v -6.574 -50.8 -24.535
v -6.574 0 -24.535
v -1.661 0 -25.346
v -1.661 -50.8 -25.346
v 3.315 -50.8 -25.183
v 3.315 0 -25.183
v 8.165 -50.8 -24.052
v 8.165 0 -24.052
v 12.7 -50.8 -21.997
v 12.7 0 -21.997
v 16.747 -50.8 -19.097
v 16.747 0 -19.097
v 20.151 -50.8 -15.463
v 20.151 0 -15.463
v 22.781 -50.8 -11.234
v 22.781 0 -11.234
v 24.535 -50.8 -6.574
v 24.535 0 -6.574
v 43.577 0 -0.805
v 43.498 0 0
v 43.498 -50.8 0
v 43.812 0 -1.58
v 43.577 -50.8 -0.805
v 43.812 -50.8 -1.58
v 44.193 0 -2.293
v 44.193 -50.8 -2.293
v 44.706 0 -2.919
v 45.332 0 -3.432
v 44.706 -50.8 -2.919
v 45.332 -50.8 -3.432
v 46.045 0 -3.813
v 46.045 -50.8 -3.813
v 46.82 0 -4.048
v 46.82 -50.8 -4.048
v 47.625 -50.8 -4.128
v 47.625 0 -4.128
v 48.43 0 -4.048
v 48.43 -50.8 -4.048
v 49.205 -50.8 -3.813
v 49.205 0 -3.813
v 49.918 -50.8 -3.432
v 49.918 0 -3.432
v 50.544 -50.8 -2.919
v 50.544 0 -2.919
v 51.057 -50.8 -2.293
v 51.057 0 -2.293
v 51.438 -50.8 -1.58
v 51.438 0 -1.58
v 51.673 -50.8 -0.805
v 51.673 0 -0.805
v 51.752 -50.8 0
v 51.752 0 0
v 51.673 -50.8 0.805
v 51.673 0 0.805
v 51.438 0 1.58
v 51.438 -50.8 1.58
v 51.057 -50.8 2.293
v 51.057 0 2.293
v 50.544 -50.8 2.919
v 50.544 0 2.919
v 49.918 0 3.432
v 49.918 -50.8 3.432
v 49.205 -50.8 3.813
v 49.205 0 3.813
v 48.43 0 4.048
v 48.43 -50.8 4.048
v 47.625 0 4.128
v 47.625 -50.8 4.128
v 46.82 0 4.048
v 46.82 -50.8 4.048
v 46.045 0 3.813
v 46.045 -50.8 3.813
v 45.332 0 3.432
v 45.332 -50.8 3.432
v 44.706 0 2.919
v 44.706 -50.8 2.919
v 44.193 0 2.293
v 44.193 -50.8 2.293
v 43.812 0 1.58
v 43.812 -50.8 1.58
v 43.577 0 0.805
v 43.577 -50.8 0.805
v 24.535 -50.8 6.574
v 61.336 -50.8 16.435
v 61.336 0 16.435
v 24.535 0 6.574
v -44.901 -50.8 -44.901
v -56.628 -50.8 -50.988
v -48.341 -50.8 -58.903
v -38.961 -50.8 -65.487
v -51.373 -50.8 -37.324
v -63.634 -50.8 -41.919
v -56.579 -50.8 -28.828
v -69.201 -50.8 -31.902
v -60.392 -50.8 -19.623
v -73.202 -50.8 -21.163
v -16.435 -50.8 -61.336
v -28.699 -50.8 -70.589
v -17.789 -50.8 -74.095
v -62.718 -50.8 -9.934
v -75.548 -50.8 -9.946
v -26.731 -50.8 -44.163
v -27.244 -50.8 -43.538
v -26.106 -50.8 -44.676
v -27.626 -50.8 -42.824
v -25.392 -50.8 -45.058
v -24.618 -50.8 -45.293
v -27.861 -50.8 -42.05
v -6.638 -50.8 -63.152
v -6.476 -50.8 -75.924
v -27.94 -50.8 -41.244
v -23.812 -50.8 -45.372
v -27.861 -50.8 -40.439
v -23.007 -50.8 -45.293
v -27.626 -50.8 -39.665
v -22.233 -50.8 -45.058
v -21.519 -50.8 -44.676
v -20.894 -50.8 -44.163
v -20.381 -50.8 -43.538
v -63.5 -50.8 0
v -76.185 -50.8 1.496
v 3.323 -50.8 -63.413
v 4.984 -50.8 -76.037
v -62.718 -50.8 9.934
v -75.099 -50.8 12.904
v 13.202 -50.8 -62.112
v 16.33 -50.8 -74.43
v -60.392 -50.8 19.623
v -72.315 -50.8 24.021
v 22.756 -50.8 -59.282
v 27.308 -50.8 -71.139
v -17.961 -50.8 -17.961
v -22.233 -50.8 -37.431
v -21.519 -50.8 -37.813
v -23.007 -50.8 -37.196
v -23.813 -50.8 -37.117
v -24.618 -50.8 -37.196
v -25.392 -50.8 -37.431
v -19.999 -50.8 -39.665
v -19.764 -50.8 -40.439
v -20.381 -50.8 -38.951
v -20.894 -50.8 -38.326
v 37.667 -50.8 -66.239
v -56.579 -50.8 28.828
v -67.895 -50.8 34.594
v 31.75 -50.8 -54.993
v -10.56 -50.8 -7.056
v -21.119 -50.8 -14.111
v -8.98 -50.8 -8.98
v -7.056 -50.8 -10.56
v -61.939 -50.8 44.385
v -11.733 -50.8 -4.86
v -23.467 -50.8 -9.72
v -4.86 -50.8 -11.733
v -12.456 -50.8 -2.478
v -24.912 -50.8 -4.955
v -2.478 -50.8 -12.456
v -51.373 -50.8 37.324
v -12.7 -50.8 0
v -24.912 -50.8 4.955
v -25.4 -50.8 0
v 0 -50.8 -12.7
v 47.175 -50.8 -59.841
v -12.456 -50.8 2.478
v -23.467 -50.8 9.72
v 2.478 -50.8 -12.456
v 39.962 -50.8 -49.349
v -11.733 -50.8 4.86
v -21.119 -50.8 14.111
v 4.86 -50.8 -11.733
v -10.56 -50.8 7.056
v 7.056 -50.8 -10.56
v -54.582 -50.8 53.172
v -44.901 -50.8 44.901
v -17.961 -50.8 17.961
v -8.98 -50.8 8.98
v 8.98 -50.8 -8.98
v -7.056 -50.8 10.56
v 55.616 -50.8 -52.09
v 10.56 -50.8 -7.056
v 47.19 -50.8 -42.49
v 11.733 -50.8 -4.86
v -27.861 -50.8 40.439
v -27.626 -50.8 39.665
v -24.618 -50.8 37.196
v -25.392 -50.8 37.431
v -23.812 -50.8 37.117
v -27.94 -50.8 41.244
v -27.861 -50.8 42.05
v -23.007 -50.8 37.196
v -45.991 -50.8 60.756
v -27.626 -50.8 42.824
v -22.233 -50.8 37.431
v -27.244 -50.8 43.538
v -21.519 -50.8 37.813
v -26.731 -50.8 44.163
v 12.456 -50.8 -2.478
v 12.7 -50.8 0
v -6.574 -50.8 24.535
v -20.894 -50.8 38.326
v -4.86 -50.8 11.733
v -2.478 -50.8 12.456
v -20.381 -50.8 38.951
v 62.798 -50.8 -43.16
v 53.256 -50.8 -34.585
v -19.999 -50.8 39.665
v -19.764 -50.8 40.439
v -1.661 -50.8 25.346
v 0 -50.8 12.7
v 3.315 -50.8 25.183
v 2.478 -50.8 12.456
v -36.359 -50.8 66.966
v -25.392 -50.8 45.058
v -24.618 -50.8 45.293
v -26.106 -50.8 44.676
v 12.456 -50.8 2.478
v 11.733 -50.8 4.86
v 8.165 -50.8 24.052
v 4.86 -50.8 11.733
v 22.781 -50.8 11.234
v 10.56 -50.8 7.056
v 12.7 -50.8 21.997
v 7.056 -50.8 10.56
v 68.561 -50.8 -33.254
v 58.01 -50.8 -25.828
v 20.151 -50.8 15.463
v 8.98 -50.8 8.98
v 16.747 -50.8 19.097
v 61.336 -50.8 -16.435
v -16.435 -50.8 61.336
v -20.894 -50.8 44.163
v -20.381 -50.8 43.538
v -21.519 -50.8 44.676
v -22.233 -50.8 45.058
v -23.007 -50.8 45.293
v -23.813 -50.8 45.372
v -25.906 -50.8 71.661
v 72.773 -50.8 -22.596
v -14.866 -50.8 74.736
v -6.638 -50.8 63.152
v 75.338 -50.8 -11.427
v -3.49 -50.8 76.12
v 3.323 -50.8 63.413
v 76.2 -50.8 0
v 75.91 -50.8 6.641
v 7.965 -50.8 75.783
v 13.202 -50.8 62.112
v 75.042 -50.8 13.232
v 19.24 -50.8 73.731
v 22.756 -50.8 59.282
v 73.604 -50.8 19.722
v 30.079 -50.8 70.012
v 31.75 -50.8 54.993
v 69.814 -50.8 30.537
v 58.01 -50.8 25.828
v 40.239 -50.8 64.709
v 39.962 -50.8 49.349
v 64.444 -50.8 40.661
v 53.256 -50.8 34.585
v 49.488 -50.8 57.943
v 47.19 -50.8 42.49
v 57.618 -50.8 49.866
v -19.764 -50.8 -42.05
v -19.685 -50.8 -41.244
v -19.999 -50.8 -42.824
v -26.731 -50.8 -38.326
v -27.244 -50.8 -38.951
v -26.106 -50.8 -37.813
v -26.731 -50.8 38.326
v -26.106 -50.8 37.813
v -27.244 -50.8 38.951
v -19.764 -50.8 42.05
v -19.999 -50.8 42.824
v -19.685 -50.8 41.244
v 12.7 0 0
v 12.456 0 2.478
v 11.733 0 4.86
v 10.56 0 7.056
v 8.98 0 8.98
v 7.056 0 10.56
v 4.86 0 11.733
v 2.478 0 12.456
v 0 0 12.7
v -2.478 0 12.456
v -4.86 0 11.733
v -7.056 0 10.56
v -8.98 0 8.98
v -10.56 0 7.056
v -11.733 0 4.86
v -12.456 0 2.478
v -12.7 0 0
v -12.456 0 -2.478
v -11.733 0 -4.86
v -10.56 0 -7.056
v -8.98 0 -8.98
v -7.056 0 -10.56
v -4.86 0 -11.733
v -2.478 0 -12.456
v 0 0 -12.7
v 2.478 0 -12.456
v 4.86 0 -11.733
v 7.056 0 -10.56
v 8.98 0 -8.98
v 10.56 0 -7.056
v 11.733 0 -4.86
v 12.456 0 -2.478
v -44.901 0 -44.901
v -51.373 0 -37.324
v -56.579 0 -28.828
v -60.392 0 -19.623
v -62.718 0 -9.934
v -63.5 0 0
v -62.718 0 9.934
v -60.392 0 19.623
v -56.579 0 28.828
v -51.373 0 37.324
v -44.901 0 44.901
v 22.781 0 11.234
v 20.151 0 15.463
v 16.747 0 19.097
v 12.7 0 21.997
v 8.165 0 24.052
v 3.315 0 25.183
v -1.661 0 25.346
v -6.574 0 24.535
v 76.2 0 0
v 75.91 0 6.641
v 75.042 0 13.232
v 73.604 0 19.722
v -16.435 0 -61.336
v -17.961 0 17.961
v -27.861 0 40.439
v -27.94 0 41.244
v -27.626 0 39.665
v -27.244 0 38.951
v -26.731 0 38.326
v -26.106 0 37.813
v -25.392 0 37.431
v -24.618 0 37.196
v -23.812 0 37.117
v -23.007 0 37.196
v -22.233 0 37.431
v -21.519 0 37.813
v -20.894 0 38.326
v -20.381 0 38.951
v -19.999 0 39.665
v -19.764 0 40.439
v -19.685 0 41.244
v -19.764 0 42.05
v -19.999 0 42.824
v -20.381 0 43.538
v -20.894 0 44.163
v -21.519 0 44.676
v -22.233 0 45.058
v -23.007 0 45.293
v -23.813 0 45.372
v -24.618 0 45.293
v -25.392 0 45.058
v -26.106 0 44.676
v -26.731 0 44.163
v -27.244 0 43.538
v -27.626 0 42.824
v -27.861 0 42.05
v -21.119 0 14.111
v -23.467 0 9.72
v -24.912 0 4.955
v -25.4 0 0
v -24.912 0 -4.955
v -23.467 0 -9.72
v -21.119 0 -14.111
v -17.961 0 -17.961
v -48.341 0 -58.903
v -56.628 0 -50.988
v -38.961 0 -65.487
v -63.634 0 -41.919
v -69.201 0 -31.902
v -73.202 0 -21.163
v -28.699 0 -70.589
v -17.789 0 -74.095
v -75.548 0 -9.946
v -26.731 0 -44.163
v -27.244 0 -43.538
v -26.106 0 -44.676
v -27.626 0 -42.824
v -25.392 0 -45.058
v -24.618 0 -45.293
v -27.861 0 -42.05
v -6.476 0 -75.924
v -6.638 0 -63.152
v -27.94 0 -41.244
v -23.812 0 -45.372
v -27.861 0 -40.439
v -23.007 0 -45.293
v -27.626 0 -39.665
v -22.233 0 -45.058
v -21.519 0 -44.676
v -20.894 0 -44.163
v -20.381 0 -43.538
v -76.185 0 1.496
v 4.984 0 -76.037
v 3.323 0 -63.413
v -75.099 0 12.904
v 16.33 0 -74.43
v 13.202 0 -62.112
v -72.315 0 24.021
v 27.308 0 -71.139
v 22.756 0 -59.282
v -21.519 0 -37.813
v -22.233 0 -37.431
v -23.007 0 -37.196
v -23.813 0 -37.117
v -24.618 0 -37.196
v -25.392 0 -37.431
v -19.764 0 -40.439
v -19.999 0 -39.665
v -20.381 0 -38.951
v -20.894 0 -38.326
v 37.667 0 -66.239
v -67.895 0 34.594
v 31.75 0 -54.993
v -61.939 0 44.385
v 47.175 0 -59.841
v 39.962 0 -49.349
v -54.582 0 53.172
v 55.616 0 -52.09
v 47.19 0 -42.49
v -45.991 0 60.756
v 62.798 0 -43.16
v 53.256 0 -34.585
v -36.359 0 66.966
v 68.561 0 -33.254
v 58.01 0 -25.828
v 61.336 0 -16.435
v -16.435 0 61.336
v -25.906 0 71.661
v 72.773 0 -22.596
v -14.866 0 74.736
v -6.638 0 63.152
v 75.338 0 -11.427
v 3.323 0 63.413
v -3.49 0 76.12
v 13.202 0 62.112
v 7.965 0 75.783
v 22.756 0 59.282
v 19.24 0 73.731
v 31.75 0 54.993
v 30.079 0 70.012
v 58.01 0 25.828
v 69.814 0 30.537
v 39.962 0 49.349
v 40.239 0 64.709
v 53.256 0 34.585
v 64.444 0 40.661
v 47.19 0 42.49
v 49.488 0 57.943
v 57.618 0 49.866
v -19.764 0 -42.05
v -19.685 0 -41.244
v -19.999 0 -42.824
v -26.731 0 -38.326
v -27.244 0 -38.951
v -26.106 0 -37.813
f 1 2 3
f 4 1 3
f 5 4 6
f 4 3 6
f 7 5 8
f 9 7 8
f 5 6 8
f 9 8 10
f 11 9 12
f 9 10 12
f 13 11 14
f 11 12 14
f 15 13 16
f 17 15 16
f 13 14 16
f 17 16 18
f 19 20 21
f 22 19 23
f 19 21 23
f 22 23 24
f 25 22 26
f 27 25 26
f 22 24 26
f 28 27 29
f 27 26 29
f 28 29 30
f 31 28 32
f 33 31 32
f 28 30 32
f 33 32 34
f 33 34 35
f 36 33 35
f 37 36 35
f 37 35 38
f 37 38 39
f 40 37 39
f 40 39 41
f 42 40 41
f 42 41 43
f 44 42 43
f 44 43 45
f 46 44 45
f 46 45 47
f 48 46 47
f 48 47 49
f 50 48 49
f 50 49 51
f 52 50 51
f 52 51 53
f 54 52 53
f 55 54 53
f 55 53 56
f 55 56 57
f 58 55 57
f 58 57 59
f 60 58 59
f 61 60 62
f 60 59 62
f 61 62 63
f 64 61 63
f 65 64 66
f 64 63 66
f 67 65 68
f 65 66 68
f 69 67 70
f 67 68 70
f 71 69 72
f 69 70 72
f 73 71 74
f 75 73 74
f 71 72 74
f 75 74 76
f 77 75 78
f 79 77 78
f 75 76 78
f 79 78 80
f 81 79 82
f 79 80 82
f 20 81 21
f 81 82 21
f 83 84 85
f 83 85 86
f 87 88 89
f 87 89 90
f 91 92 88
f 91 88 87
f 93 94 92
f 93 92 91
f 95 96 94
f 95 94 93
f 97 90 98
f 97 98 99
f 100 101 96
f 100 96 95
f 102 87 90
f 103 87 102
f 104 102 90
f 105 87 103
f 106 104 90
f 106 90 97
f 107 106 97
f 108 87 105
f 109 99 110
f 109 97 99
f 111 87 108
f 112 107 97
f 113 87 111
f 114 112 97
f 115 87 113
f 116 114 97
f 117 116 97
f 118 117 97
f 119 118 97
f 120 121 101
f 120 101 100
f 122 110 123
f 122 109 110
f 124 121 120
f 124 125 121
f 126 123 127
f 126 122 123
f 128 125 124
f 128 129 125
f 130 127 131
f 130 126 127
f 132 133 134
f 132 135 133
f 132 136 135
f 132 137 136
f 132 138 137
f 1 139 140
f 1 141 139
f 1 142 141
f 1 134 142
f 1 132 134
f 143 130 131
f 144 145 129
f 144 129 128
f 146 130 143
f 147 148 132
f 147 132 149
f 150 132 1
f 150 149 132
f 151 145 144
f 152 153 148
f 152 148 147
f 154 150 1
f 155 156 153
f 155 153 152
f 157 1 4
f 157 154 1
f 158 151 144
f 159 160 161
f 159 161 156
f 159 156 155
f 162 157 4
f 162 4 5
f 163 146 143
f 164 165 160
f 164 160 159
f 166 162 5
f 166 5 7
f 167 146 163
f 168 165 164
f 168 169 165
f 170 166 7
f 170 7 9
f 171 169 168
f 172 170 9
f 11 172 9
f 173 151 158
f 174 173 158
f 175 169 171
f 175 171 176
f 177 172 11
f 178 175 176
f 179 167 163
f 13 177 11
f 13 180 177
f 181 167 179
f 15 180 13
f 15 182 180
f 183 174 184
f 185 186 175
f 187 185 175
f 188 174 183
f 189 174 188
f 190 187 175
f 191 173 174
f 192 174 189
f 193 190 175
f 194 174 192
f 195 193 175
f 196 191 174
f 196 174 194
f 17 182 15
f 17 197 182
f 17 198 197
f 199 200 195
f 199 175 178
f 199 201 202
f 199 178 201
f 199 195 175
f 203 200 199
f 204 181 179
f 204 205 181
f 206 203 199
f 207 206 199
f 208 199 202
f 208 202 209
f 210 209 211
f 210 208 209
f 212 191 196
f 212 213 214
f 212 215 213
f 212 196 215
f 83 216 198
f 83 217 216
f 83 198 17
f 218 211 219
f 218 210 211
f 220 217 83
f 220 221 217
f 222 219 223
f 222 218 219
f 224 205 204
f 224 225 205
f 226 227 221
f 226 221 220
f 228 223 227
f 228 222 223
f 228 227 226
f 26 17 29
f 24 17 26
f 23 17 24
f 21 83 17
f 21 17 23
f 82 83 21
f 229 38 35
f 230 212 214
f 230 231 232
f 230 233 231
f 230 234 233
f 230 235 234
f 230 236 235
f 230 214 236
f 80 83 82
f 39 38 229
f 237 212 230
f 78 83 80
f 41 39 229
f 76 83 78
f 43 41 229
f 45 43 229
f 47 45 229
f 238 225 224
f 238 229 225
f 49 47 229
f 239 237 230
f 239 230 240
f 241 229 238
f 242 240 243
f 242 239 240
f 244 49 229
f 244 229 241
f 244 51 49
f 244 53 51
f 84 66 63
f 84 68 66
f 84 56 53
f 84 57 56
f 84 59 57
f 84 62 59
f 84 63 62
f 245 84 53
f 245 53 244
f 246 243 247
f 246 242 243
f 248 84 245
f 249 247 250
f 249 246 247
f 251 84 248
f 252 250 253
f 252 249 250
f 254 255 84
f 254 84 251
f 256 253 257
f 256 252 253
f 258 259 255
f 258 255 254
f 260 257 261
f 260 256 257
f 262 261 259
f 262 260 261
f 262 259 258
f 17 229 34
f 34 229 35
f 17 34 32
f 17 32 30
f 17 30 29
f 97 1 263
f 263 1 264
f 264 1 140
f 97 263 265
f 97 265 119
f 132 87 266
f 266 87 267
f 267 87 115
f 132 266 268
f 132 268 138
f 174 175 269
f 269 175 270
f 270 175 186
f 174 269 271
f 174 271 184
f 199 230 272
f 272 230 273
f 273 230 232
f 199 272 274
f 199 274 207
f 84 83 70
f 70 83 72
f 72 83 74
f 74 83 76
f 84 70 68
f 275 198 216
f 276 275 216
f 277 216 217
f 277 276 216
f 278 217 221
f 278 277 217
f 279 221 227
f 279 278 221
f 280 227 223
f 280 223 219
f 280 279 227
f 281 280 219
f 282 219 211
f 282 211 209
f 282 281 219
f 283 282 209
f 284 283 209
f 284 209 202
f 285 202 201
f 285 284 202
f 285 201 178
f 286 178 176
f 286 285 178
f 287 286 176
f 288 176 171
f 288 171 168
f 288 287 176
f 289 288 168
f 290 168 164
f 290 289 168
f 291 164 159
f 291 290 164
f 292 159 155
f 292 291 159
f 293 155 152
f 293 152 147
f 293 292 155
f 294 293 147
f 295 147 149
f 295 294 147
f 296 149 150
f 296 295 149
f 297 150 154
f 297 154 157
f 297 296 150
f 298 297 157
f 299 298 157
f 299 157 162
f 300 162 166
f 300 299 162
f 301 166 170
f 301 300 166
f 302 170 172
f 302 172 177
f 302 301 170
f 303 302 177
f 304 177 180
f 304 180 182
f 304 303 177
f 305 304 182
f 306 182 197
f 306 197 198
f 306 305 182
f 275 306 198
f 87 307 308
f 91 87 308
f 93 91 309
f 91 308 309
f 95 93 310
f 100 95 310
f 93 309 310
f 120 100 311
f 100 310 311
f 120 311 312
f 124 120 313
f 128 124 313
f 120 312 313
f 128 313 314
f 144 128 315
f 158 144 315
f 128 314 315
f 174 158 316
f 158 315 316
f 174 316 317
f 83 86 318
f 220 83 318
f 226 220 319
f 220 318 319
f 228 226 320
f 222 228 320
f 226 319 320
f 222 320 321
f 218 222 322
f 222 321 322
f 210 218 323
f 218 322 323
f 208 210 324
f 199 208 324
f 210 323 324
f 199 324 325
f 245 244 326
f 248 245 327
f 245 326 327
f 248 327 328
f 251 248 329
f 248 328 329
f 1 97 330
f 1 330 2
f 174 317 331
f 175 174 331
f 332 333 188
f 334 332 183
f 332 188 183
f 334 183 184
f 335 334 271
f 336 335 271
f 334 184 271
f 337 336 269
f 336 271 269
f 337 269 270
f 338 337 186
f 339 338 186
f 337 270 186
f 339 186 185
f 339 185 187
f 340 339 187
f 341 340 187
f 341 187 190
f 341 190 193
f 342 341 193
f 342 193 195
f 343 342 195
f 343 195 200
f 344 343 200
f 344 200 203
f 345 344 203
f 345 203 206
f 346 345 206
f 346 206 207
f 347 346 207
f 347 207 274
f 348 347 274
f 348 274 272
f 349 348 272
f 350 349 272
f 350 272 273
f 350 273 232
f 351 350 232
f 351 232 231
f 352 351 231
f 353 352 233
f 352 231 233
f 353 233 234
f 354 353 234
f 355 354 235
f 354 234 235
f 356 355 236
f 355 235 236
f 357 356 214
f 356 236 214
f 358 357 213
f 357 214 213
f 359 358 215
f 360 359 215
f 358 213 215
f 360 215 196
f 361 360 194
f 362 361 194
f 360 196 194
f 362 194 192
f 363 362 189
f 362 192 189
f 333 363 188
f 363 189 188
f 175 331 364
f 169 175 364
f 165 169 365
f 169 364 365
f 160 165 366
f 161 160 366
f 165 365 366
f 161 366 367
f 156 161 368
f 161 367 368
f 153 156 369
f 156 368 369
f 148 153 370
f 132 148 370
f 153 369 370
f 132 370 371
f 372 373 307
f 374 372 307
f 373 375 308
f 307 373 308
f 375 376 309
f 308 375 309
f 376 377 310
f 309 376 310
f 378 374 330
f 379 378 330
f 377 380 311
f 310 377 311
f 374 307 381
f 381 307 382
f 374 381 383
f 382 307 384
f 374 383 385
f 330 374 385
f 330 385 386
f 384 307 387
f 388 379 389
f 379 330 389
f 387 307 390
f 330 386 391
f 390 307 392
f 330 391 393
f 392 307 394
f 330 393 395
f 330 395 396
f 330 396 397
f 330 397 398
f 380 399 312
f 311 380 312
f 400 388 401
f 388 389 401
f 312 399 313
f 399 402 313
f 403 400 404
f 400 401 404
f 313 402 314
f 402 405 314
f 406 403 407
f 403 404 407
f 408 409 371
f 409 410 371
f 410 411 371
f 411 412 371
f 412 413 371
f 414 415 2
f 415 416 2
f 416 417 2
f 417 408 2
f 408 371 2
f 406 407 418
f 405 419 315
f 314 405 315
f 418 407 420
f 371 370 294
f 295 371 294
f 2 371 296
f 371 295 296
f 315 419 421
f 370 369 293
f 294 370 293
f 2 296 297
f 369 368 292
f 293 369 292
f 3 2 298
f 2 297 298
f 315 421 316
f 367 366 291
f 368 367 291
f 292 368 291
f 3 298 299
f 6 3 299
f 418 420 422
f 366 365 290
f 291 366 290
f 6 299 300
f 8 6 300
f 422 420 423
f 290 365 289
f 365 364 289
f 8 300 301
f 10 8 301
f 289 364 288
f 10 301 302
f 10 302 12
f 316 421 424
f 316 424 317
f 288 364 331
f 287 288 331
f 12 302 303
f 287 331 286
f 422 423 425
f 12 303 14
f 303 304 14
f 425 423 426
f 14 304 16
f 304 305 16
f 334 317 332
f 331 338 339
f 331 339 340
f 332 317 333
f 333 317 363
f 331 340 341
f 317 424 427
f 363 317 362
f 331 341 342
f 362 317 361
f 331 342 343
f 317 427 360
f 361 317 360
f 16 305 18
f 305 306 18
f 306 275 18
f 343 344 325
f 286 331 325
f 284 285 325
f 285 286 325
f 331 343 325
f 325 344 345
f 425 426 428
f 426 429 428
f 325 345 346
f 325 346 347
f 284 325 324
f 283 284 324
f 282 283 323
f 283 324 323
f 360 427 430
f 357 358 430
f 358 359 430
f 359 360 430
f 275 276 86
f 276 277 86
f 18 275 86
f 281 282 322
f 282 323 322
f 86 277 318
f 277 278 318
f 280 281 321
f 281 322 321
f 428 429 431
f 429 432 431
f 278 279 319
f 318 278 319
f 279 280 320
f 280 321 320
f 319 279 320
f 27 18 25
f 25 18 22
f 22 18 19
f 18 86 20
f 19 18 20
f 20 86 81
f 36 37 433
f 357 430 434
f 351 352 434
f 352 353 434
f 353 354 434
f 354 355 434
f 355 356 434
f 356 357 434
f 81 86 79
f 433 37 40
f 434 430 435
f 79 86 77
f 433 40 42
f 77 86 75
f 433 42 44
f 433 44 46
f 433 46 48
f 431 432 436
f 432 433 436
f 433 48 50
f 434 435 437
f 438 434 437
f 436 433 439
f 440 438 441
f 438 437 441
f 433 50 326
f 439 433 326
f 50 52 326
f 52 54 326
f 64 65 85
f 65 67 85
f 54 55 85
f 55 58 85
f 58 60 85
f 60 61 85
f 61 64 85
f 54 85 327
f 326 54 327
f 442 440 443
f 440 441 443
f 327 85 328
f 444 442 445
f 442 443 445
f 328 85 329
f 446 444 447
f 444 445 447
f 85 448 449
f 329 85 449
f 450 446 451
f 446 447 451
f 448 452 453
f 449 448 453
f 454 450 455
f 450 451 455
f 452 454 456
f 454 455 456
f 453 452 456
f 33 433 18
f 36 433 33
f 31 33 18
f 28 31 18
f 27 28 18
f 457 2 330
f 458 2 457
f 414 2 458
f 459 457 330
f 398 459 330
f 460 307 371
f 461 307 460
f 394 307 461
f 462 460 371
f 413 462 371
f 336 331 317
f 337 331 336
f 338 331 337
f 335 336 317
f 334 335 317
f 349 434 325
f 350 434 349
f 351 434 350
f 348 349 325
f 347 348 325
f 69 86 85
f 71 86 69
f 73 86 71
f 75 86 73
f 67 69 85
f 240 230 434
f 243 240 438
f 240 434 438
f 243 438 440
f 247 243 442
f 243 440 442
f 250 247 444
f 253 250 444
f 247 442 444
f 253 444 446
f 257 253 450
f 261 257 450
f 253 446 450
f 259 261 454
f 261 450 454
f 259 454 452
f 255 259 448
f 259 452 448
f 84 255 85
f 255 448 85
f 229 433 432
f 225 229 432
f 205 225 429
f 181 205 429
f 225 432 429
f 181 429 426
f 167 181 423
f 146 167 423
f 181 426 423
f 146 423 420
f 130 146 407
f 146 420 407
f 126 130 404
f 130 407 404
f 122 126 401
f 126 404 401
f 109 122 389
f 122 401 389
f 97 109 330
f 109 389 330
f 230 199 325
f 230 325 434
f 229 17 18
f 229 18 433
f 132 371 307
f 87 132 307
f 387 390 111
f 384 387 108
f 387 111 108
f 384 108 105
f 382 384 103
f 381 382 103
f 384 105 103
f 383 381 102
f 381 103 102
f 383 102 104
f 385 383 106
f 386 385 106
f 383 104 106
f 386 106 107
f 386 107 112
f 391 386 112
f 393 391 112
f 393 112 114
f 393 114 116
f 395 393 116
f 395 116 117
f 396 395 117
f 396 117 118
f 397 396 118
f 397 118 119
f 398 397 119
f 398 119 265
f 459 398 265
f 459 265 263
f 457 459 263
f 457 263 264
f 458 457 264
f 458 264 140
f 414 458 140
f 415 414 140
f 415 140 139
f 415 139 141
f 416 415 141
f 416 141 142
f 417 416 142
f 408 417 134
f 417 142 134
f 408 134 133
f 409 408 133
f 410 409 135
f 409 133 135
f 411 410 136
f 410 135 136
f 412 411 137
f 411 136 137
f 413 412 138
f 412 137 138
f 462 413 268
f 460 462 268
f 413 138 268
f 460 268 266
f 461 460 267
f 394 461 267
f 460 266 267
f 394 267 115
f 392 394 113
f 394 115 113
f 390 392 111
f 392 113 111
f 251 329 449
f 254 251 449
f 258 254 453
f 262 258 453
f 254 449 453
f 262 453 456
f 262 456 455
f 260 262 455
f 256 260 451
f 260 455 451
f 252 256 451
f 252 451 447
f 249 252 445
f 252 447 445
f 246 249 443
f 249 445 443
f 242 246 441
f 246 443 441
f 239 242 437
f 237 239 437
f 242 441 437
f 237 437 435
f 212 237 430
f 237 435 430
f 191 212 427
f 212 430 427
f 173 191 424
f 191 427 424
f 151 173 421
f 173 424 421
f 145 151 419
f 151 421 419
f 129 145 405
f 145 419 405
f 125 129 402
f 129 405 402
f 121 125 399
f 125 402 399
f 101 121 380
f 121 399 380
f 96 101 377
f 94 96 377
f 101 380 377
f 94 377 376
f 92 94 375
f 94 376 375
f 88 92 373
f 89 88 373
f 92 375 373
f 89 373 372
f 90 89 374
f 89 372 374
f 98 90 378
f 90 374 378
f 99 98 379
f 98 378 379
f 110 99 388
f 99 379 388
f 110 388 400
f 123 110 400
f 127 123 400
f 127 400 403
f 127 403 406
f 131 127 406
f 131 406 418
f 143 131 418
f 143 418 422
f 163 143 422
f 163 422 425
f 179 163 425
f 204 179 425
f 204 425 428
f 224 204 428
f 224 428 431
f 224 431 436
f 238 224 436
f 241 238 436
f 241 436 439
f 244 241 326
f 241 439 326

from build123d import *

# Parameters (mm, degrees)
F0_R     = 12.7
F1_DEPTH = 50.8
F2_D     = 8.255


with BuildPart() as f1:
    # F0 (on Front) → F1 (new body)
    with BuildSketch(Plane.XZ):
        with BuildLine():
            ThreePointArc((73.603548, 19.722011), (-75.548098, -9.946096), (76.2, 0))
            ThreePointArc((76.2, 0), (75.548098, 9.946096), (73.603548, 19.722011))
        make_face()
        with BuildLine():
            Line((24.534516, -6.574004), (61.33629, -16.435009))
            ThreePointArc((61.33629, -16.435009), (31.75, -54.992613), (-16.435009, -61.33629))
            Line((-16.435009, -61.33629), (-6.574004, -24.534516))
            ThreePointArc((-6.574004, -24.534516), (12.7, -21.997045), (24.534516, -6.574004))
        make_face(mode=Mode.SUBTRACT)
        with BuildLine():
            ThreePointArc((-44.901281, -44.901281), (-63.5, 0), (-44.901281, 44.901281))
            Line((-44.901281, 44.901281), (-17.960512, 17.960512))
            ThreePointArc((-17.960512, 17.960512), (-25.4, 0), (-17.960512, -17.960512))
            Line((-17.960512, -17.960512), (-44.901281, -44.901281))
        make_face(mode=Mode.SUBTRACT)
        Circle(F0_R, mode=Mode.SUBTRACT)
        with BuildLine():
            ThreePointArc((-16.435009, 61.33629), (31.75, 54.992613), (61.33629, 16.435009))
            Line((61.33629, 16.435009), (24.534516, 6.574004))
            ThreePointArc((24.534516, 6.574004), (12.7, 21.997045), (-6.574004, 24.534516))
            Line((-6.574004, 24.534516), (-16.435009, 61.33629))
        make_face(mode=Mode.SUBTRACT)
    extrude(amount=F1_DEPTH)

    # F2 (through all)
    with Locations(Plane(origin=(0, 0, 0), x_dir=(1, 0, 0), z_dir=(0, 1, 0))):
        with Locations((47.625, 0), (-23.8125, -41.24446), (-23.8125, 41.24446)):
            Hole(F2_D / 2)


solid = f1.part
